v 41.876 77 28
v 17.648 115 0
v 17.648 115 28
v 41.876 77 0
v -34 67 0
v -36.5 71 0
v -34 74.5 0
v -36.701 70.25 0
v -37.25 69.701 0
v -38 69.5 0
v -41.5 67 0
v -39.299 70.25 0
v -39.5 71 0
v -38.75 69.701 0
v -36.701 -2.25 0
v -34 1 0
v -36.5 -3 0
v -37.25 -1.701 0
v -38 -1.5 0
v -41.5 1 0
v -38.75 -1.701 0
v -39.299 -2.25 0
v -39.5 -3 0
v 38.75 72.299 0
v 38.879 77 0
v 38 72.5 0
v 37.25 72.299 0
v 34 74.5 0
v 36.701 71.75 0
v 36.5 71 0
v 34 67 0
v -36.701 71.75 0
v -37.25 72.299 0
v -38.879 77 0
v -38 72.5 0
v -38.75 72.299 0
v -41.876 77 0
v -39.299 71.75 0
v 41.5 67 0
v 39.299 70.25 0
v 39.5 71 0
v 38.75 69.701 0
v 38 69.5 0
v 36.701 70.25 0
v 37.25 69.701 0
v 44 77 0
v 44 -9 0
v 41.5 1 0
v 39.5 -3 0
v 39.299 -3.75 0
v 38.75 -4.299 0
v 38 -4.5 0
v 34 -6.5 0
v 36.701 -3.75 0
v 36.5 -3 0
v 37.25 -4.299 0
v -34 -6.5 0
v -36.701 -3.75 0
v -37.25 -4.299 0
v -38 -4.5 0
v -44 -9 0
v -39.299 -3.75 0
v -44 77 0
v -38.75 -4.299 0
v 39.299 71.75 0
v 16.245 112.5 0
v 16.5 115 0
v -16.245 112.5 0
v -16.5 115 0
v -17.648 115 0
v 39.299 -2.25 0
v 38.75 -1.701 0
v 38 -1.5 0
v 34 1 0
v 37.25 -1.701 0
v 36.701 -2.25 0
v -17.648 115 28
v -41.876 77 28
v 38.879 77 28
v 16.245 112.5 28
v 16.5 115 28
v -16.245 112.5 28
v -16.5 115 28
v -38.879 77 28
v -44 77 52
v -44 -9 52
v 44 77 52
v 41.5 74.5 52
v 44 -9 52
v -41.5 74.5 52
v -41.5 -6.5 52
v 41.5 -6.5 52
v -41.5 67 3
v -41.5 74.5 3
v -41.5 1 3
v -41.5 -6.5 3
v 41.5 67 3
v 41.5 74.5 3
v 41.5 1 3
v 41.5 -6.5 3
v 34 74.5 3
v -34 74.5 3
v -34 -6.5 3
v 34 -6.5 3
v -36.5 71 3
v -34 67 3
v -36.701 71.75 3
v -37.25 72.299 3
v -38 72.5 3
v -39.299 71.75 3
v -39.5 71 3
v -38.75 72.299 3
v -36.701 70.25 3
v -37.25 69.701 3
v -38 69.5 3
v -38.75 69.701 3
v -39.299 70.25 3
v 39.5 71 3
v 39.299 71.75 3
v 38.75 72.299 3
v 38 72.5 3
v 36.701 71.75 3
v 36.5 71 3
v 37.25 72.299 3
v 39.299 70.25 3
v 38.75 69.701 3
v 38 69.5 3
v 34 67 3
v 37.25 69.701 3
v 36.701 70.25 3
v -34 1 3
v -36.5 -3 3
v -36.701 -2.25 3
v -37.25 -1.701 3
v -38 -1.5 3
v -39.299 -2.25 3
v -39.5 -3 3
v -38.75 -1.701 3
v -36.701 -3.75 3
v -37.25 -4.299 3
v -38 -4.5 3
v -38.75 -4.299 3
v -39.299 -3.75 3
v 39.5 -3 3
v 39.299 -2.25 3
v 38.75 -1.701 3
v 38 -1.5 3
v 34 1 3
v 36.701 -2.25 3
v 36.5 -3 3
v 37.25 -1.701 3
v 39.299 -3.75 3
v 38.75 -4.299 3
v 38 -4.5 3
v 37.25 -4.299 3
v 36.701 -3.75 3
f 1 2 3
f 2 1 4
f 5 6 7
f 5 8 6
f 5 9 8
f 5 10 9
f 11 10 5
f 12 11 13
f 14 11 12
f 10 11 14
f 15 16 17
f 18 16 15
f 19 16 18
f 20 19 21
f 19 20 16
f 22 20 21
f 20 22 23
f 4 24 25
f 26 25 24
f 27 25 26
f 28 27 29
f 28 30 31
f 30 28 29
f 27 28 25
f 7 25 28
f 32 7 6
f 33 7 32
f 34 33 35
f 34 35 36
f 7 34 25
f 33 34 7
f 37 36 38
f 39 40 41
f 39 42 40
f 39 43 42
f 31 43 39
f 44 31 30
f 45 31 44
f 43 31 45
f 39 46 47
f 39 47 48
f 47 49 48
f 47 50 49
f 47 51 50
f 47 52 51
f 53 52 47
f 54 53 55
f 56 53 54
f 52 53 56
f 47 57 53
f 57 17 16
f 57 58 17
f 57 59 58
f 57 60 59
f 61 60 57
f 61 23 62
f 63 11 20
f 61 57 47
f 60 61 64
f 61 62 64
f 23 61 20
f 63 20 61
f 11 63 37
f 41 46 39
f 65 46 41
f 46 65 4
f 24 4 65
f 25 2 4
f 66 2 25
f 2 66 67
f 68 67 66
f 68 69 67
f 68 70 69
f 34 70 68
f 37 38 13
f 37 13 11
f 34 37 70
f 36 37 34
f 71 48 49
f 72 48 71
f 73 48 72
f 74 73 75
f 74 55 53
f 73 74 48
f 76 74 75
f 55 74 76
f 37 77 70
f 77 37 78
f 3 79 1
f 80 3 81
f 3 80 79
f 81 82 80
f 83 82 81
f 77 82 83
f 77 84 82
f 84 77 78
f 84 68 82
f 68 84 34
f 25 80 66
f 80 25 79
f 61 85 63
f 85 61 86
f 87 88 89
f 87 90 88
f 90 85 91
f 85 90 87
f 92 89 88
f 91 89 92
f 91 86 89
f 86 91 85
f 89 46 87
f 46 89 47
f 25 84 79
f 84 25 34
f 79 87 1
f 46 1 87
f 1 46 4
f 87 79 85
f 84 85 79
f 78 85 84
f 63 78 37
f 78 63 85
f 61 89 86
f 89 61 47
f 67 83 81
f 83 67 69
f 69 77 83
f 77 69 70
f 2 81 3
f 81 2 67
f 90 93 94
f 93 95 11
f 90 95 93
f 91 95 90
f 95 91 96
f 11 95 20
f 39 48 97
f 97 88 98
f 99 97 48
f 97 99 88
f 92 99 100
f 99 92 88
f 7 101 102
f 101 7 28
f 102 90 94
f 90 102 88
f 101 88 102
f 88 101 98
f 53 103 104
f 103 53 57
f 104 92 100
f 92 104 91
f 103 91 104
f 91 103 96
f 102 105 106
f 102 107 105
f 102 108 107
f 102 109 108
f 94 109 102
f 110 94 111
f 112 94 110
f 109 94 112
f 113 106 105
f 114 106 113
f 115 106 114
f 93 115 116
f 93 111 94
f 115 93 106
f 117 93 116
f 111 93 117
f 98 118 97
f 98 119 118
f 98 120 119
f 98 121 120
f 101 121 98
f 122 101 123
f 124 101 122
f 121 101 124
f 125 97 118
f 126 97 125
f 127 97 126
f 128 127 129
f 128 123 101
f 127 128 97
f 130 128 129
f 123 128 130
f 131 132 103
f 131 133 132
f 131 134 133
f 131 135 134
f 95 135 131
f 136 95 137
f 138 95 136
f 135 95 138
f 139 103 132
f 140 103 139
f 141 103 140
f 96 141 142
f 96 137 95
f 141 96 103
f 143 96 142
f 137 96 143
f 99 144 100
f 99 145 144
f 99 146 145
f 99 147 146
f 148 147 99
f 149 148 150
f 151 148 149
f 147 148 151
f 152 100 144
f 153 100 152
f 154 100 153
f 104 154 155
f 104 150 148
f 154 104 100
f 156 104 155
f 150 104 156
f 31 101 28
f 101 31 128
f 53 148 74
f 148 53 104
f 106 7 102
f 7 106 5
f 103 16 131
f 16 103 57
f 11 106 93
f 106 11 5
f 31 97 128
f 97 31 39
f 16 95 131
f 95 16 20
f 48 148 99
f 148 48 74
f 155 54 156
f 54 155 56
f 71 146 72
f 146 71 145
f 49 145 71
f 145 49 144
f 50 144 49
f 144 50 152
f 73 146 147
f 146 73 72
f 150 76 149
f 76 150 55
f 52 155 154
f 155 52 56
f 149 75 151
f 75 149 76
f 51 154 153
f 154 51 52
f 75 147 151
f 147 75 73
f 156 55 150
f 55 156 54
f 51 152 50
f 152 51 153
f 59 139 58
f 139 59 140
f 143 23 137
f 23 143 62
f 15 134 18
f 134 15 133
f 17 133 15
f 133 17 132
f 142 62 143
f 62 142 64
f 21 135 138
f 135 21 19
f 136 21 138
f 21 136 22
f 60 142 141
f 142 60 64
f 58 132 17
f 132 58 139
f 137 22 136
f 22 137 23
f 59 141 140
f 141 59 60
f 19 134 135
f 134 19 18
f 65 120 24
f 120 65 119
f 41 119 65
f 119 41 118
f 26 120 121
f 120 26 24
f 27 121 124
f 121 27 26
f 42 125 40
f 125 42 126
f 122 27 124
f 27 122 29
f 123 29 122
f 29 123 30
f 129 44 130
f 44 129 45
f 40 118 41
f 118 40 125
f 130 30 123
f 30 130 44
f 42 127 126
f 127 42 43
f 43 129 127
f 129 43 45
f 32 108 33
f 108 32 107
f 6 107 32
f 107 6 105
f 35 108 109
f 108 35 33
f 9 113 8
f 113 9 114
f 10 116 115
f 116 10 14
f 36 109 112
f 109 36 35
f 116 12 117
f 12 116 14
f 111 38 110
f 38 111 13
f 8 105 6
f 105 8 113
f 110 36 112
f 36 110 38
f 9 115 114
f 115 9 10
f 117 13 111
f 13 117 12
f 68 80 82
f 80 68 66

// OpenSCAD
rotate([0,180,0])
difference(){
union(){
translate([0,34,-26])cube([88,86,52],center=true);

difference(){
translate([0,96.7,-28])scale([1.154,1.045,1])
rotate([0,0,90])cylinder(h=28,d=88,$fn=3);
translate([0,92,-29])scale([1.154,1.045,1])
rotate([0,0,90])cylinder(h=30,d=88,$fn=3);
}
}
translate([0,160,-44])cube(90,center=true);
translate([0,34,-26])cube([83,81,54],center=true);
}
translate([-16.5,112.5,0])cube([33,2.5,28]);

$fn=12;

difference(){
translate([0,34,1.5])cube([88,86,3],center=true);
translate([0,34,2.5])cube([68,86,6],center=true);
translate([0,34,2.5])cube([88,66,6],center=true);
translate([38,-3,-1])cylinder(d=3,h=10);
translate([-38,-3,-1])cylinder(d=3,h=10); 
translate([38,71,-1])cylinder(d=3,h=10); 
translate([-38,71,-1])cylinder(d=3,h=10);     
}
